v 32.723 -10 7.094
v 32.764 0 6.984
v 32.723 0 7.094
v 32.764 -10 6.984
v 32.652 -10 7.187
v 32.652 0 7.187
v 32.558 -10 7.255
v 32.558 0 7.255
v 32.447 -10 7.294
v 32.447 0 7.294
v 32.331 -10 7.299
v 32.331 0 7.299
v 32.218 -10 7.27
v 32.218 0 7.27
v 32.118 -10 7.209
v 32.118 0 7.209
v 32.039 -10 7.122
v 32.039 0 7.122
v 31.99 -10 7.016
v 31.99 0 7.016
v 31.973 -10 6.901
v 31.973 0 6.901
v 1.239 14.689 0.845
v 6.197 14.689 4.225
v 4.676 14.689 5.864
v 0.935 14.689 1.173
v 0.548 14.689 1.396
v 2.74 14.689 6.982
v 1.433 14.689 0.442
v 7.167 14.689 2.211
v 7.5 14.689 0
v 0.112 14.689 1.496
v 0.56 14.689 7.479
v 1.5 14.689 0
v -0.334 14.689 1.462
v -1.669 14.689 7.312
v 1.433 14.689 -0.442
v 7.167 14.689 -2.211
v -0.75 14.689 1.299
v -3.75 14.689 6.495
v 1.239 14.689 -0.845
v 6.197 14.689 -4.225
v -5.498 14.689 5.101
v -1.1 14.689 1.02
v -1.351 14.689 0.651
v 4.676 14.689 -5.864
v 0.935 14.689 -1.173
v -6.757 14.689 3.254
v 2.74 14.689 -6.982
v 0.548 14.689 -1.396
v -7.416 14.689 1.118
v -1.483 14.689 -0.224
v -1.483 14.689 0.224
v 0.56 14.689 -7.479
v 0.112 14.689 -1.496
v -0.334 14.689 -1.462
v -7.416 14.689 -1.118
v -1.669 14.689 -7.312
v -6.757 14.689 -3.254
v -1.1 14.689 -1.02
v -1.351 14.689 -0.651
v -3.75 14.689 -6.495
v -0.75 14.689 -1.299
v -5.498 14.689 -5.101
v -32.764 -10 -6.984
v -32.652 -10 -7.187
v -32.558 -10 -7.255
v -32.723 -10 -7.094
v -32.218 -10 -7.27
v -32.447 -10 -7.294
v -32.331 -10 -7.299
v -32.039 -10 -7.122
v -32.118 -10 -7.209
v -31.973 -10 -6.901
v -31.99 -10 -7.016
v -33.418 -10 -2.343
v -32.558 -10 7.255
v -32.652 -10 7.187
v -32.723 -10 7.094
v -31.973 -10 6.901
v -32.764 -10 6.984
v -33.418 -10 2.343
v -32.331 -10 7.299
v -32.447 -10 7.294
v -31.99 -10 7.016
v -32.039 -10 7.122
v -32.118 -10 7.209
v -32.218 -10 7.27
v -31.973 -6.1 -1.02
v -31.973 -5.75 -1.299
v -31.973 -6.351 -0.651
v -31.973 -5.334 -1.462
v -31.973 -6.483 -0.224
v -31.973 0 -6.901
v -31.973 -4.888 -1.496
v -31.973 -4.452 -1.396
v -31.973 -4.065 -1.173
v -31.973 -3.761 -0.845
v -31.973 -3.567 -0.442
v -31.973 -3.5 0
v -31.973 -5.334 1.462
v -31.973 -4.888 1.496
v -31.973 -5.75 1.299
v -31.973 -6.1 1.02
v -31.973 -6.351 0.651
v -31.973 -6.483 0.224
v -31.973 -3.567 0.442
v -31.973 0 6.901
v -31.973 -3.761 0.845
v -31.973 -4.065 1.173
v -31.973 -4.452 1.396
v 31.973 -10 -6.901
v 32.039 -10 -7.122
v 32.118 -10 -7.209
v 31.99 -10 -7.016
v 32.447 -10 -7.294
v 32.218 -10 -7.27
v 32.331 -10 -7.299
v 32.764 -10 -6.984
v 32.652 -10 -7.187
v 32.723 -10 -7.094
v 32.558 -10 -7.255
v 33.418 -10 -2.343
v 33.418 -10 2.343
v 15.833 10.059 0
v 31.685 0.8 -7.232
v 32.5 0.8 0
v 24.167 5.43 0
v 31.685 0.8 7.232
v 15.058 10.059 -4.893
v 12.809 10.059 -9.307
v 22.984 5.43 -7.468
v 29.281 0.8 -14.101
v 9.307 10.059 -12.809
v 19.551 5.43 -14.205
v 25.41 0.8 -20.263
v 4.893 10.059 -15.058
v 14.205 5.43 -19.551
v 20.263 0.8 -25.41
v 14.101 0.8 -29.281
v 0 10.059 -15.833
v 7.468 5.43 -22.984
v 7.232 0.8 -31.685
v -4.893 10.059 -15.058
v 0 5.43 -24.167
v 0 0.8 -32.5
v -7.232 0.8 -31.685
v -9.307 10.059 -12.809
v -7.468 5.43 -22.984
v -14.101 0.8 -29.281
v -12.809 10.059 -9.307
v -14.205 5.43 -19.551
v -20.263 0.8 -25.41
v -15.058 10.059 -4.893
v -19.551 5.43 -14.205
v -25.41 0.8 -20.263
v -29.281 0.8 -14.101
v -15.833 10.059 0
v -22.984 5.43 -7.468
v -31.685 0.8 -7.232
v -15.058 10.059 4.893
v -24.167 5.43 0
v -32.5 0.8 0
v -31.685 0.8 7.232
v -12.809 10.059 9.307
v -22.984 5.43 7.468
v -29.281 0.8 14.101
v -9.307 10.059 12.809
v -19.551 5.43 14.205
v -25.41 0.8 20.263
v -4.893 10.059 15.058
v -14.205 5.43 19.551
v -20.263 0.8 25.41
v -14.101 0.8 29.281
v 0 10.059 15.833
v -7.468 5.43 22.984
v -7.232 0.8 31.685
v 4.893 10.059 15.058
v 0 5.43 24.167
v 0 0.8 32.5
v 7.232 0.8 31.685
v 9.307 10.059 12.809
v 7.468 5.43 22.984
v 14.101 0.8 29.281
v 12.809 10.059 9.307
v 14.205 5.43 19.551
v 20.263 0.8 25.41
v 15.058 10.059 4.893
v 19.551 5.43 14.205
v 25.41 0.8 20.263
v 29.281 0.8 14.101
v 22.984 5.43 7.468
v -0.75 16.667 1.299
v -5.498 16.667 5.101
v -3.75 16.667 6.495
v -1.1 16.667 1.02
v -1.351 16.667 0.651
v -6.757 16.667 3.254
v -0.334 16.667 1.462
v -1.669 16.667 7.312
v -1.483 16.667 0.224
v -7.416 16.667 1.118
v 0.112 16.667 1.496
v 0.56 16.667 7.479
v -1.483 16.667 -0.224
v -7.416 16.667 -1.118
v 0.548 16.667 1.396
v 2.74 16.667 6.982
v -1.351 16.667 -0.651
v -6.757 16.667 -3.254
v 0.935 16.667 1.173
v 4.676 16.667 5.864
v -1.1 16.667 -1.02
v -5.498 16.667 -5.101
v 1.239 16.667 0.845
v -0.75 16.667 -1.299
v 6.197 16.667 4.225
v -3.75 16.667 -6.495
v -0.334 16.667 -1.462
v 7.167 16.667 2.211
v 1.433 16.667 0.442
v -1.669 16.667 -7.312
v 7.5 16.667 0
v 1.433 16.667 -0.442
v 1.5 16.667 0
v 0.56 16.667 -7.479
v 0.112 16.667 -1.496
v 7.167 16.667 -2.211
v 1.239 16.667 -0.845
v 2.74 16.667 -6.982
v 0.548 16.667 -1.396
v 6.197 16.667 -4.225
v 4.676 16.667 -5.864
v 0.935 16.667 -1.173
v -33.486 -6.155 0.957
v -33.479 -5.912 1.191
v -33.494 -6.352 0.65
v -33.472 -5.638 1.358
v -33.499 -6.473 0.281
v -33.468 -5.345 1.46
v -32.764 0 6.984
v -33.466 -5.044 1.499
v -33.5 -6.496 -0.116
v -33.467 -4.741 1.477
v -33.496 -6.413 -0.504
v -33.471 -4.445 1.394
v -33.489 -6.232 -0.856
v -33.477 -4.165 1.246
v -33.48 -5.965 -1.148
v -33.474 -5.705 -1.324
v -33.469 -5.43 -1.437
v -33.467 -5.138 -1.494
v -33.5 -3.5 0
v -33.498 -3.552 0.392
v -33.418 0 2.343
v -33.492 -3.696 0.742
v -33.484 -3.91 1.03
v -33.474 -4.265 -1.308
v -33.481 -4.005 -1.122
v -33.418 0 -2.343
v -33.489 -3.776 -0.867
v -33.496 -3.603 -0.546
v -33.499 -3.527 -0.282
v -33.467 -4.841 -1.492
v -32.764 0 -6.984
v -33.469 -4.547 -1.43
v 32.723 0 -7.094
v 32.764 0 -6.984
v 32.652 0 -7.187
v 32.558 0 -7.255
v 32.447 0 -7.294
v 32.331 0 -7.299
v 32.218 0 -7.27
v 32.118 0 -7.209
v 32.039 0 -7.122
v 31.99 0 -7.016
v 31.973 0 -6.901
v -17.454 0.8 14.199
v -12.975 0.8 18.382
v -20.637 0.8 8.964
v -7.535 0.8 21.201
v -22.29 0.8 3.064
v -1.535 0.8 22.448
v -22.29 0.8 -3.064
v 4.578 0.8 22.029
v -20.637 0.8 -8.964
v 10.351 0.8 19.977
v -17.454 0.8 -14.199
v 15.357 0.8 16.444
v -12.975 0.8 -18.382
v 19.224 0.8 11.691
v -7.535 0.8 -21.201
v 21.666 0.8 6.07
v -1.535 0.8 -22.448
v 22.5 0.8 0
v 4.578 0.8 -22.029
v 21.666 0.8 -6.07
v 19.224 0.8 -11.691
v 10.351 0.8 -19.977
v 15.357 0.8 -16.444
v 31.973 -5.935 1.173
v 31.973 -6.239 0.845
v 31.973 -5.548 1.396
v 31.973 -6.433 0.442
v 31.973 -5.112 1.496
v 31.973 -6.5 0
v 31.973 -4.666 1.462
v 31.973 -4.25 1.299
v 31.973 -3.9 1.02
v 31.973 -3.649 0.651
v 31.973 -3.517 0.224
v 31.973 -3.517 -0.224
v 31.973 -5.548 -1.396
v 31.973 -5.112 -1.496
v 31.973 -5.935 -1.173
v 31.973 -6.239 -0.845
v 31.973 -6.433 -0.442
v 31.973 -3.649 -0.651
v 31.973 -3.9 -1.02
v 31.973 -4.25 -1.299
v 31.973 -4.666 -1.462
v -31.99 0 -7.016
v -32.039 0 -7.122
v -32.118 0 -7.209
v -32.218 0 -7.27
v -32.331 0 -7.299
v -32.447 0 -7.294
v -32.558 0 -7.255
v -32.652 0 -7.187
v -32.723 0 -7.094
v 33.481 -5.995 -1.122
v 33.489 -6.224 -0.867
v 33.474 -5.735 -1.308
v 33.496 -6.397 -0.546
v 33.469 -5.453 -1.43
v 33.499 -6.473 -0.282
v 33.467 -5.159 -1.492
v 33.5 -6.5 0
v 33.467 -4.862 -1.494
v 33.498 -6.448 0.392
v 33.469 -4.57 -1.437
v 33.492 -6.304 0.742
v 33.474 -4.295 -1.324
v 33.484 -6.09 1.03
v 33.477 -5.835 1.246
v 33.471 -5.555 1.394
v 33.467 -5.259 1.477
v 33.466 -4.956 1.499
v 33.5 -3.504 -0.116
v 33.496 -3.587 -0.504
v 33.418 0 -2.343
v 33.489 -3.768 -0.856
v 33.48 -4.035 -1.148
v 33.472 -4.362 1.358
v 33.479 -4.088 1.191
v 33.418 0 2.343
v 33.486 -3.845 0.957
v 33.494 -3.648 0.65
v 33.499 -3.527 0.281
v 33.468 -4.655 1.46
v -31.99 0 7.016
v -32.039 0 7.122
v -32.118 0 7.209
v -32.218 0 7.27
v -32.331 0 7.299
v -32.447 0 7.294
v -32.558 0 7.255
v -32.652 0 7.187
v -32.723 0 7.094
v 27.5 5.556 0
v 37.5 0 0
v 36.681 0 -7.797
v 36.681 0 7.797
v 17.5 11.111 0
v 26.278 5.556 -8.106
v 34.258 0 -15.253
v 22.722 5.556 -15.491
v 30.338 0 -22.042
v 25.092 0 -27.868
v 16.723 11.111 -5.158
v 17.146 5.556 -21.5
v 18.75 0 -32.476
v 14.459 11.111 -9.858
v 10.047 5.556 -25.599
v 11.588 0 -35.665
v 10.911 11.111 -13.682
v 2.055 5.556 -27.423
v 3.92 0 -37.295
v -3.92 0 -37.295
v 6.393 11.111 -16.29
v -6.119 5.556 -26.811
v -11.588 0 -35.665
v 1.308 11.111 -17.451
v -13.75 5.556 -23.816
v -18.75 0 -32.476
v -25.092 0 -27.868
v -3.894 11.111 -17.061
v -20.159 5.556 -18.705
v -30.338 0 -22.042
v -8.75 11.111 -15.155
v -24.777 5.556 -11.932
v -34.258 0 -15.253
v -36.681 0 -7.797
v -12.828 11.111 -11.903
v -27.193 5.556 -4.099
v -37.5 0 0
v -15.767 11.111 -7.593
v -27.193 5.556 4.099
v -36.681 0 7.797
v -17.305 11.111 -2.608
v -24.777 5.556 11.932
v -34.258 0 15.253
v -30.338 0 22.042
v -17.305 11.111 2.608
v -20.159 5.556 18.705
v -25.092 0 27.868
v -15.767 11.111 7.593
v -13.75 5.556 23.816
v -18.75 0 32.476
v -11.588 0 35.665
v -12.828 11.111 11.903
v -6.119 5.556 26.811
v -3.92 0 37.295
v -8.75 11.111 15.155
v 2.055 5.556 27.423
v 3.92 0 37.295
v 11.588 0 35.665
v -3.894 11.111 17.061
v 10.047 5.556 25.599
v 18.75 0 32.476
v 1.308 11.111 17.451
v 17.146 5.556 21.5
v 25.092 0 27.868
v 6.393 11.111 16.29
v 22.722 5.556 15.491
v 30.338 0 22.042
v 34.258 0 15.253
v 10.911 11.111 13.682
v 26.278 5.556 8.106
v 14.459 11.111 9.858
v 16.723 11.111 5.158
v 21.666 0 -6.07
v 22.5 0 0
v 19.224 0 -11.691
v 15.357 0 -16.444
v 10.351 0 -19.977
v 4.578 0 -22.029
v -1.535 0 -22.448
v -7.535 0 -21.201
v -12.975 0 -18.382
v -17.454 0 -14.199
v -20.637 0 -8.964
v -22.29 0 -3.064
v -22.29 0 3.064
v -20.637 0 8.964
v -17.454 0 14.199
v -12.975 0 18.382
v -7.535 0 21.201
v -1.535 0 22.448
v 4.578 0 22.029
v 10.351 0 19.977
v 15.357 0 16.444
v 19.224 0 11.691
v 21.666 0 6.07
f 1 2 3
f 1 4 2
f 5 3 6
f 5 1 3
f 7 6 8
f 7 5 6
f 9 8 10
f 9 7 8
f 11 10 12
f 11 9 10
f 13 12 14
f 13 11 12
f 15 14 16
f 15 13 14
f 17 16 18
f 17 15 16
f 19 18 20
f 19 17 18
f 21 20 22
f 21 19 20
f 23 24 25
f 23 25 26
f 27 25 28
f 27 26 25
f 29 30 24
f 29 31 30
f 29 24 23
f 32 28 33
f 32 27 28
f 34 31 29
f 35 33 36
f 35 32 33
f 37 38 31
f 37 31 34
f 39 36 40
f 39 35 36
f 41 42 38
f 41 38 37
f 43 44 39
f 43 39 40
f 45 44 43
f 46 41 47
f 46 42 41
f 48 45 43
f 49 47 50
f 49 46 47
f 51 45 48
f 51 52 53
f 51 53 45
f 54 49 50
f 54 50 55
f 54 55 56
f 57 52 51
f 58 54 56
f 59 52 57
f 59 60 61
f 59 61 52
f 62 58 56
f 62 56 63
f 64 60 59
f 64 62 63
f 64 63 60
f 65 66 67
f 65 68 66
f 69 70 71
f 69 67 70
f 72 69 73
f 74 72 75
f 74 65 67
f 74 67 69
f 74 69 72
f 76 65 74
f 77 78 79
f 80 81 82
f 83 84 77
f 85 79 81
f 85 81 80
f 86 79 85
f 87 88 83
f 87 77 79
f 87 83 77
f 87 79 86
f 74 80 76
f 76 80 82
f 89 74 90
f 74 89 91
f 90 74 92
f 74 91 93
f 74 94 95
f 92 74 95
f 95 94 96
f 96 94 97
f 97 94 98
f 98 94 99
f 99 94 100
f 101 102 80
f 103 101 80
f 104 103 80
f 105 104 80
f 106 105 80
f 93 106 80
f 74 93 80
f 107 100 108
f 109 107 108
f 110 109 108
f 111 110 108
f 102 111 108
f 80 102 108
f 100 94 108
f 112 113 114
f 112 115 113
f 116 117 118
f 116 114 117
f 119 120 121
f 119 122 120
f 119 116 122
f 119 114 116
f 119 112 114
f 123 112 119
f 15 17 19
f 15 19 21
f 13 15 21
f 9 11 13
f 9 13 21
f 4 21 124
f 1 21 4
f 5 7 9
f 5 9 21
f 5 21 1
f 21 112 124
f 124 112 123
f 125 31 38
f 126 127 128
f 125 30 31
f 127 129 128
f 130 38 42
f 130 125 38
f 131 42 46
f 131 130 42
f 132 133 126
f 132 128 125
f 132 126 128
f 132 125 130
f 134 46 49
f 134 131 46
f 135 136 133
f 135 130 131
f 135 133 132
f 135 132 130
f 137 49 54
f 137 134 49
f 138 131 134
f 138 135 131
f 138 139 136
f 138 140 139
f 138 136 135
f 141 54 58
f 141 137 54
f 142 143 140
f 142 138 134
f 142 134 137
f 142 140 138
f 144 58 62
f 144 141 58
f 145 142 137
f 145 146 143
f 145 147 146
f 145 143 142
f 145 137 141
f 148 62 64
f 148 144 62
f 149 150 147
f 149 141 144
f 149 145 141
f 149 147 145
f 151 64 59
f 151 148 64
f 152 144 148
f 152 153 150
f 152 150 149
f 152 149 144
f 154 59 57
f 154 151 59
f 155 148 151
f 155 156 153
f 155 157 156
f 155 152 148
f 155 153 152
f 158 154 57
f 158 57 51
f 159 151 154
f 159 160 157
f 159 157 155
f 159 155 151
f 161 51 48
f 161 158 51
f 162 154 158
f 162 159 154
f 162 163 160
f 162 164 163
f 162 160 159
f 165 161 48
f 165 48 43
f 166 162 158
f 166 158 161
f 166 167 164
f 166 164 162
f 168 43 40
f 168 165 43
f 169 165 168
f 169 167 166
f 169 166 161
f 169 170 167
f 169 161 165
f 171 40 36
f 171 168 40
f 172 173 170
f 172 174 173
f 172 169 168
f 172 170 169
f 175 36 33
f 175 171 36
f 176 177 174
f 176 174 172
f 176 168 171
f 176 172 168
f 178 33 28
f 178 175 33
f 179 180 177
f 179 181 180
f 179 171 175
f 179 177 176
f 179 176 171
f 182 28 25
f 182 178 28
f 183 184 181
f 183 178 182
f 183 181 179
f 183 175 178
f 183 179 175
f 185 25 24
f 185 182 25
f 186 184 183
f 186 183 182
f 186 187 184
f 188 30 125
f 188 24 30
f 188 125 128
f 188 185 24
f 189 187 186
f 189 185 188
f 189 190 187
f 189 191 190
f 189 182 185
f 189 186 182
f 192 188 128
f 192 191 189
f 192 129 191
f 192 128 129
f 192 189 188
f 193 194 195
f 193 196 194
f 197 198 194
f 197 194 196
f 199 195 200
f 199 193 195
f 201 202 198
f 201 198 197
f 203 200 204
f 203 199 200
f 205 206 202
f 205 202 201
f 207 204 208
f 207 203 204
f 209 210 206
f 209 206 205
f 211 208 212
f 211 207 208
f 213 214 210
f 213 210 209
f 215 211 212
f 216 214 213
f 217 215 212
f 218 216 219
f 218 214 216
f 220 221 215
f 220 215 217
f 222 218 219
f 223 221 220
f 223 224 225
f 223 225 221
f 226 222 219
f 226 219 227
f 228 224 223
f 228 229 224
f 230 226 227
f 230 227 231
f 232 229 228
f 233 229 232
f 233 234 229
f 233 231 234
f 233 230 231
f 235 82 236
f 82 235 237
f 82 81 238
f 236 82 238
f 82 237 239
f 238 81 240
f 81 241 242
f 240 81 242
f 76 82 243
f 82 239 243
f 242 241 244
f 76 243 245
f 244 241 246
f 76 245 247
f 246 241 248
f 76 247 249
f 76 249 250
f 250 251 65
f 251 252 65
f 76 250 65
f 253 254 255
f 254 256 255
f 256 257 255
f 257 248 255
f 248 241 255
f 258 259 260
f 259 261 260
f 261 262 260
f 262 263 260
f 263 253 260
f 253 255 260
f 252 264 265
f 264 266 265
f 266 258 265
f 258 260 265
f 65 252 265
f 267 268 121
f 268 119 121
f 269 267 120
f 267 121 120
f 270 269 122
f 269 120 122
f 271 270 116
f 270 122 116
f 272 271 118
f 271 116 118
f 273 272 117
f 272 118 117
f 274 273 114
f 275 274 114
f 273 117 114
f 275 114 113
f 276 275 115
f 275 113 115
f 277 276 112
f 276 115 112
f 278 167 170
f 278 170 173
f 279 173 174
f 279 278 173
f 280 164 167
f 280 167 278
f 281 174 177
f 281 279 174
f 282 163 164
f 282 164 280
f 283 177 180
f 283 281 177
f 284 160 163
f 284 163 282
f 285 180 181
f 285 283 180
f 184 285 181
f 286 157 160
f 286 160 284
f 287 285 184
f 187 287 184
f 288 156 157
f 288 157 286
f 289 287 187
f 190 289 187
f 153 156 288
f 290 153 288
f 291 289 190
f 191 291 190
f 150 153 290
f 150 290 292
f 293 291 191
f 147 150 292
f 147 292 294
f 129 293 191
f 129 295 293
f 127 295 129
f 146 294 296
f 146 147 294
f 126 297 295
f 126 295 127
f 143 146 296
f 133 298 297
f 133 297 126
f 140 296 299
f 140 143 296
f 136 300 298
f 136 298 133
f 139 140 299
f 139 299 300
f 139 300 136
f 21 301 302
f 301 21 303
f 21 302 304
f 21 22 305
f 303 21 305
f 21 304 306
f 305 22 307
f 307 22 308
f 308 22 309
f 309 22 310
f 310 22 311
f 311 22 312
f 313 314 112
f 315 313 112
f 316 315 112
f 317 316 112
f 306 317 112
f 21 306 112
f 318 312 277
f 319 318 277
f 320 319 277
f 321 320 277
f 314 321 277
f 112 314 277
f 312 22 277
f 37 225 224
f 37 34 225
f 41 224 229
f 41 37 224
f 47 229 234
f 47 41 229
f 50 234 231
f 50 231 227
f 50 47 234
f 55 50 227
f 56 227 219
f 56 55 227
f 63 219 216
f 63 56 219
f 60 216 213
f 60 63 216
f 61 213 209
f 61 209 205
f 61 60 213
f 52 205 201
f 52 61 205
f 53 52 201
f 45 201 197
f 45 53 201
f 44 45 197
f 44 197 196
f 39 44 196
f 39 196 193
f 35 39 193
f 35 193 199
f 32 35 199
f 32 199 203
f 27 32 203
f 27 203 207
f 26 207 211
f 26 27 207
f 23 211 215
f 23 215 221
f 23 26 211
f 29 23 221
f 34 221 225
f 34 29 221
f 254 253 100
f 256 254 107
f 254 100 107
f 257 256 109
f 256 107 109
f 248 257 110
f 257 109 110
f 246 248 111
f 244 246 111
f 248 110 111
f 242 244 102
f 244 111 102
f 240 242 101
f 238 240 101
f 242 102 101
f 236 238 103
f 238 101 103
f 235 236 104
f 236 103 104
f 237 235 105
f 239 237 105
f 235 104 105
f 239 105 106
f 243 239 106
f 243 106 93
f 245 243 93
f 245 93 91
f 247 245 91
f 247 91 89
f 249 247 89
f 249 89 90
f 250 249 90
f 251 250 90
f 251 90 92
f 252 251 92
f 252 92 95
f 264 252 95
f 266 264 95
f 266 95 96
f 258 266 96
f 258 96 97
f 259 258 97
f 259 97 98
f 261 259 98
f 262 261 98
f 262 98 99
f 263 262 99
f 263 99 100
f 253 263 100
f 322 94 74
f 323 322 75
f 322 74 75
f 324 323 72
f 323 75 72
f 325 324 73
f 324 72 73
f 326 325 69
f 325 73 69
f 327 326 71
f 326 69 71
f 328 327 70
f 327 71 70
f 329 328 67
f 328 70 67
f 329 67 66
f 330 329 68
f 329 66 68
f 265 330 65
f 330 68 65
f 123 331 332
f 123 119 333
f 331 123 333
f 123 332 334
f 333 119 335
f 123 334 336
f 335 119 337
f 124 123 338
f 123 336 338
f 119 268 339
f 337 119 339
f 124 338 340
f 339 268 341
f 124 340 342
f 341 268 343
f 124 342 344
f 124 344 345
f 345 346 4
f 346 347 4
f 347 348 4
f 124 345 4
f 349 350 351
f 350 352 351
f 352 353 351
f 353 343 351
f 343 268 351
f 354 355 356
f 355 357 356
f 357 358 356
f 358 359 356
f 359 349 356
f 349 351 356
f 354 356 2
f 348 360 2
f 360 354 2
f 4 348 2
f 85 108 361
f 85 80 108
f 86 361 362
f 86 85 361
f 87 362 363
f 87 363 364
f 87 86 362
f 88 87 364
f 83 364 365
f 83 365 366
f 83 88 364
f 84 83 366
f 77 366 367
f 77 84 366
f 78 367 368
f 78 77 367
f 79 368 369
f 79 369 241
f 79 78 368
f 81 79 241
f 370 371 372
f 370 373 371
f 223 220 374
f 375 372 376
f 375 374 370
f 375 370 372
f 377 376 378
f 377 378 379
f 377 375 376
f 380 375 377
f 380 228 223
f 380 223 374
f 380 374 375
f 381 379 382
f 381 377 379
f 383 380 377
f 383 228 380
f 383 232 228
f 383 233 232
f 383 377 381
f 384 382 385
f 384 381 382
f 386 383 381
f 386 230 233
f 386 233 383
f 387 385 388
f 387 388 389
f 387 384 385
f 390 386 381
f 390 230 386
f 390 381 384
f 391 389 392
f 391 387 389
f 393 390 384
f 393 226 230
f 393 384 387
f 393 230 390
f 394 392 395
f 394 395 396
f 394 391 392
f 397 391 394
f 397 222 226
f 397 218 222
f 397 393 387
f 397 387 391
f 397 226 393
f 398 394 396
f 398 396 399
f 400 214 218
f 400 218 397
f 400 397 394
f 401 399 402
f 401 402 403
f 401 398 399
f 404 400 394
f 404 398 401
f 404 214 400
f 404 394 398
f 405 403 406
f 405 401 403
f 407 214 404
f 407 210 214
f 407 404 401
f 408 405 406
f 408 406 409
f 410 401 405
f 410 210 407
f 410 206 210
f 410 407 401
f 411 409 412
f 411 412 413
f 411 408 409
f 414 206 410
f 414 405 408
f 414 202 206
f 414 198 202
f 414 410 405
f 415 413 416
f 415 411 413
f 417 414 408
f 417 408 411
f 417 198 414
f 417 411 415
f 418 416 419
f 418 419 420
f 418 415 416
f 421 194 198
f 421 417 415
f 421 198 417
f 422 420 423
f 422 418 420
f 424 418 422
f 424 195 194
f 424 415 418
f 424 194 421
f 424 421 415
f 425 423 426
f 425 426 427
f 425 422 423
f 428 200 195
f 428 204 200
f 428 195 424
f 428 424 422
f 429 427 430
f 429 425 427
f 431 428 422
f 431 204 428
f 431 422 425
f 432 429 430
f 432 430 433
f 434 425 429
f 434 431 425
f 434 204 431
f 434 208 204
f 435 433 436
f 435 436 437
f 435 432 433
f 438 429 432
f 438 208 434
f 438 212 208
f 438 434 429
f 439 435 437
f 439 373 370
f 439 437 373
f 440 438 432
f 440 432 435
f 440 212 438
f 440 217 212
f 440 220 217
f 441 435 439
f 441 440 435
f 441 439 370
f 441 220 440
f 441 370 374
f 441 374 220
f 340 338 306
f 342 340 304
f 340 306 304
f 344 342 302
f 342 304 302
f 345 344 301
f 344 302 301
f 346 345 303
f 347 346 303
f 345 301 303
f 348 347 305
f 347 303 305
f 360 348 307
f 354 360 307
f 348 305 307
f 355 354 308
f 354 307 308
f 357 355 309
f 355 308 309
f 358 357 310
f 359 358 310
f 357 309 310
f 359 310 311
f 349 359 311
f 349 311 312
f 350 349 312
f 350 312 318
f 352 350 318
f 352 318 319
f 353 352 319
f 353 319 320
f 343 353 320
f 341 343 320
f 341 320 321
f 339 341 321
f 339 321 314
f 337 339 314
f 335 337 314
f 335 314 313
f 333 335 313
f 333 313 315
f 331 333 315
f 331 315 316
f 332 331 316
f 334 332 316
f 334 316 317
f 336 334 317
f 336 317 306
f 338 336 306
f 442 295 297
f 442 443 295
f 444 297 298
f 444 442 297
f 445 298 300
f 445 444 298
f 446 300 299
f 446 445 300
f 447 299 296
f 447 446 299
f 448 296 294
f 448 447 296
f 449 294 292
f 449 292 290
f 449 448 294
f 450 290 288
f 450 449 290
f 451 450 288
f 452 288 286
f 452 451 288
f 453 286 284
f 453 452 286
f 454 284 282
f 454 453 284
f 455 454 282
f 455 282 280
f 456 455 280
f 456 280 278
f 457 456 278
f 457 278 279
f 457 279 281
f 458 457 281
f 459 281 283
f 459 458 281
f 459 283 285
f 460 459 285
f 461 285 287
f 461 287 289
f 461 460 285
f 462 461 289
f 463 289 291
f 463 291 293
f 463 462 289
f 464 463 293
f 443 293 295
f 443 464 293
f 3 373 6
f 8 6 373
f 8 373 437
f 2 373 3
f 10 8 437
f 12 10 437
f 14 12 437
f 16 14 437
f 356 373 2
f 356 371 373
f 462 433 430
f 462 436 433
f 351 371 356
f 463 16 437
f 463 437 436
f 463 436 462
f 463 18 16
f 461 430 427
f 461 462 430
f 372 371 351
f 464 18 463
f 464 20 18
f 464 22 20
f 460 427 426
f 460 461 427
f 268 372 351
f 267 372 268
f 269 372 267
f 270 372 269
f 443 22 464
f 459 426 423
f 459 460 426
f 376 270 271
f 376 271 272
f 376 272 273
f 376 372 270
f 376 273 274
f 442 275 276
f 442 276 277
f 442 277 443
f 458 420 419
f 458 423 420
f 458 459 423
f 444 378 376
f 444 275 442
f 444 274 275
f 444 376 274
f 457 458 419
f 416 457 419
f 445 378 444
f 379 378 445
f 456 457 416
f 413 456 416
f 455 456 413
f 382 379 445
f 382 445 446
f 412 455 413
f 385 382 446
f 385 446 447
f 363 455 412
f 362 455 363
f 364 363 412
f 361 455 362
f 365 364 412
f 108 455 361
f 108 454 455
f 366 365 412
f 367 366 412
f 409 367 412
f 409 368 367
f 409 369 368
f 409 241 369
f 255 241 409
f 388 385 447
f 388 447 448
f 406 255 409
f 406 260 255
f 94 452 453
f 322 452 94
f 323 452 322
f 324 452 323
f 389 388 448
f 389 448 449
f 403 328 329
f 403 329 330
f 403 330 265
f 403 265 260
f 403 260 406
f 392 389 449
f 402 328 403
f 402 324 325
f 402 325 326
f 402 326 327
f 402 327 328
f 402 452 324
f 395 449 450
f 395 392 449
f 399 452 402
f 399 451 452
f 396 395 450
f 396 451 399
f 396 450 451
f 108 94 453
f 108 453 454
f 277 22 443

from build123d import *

# Parameters (mm, degrees)
F3_DEPTH = 10
F4_R     = 1.5
F5_DEPTH = 25
F6_R     = 1.5
F7_DEPTH = 25
F8_F1_R  = 0.4
F8_F2_R  = 0.4
F8_F3_R  = 0.4
F8_F4_R  = 0.4


# Not quite as in the source:
# - a feature names something its author has since deleted; it is built from what else it names


with BuildPart() as f1:
    # F0 (on Top) → F1 (revolve)
    with BuildSketch(Plane.XY):
        Polygon((22.5, 0.8), (22.5, 0), (37.5, 0), (7.5, 16.6666666667), (1.5, 16.6666666667), (1.5, 14.6888888889), (7.5, 14.6888888889), (32.5, 0.8), align=None)
    revolve(axis=Axis((0, 10, 0), (0, 1, 0)))

    # F2 (on face) → F3 (join)
    with BuildSketch(Plane.XZ):
        with BuildLine():
            Line((-31.9726445575, -10), (-31.9726445575, 10))
            ThreePointArc((-31.9726445575, 10), (-33.5, 0), (-31.9726445575, -10))
        make_face()
        with BuildLine():
            ThreePointArc((31.9726445575, -10), (33.5, 0), (31.9726445575, 10))
            Line((31.9726445575, 10), (31.9726445575, -10))
        make_face()
    extrude(amount=F3_DEPTH)

    # F4 (on face) → F5 (cut)
    with BuildSketch(Plane.YZ.offset(-31.9726445575)):
        with Locations((-5, 0)):
            Circle(F4_R)
    extrude(amount=-F5_DEPTH, mode=Mode.SUBTRACT)

    # F6 (on face) → F7 (cut)
    with BuildSketch(Plane(origin=(31.9726445575, 0, 0), x_dir=(0, -1, 0), z_dir=(-1, 0, 0))):
        with Locations((5, 0)):
            Circle(F6_R)
    extrude(amount=-F7_DEPTH, mode=Mode.SUBTRACT)

    # F8: fillet of radius 0.4 on 4 edges, made by hand

    # F8_f1
    f8_f1_edges = [f1.edges().sort_by_distance(p)[0] for p in [
        (31.9726445575, -5, 10),
    ]]
    fillet(f8_f1_edges, radius=F8_F1_R)

    # F8_f2
    f8_f2_edges = [f1.edges().sort_by_distance(p)[0] for p in [
        (31.9726445575, -5, -10),
    ]]
    fillet(f8_f2_edges, radius=F8_F2_R)

    # F8_f3
    f8_f3_edges = [f1.edges().sort_by_distance(p)[0] for p in [
        (-31.9726445575, -5, -10),
    ]]
    fillet(f8_f3_edges, radius=F8_F3_R)

    # F8_f4
    f8_f4_edges = [f1.edges().sort_by_distance(p)[0] for p in [
        (-31.9726445575, -5, 10),
    ]]
    fillet(f8_f4_edges, radius=F8_F4_R)


solid = f1.part
